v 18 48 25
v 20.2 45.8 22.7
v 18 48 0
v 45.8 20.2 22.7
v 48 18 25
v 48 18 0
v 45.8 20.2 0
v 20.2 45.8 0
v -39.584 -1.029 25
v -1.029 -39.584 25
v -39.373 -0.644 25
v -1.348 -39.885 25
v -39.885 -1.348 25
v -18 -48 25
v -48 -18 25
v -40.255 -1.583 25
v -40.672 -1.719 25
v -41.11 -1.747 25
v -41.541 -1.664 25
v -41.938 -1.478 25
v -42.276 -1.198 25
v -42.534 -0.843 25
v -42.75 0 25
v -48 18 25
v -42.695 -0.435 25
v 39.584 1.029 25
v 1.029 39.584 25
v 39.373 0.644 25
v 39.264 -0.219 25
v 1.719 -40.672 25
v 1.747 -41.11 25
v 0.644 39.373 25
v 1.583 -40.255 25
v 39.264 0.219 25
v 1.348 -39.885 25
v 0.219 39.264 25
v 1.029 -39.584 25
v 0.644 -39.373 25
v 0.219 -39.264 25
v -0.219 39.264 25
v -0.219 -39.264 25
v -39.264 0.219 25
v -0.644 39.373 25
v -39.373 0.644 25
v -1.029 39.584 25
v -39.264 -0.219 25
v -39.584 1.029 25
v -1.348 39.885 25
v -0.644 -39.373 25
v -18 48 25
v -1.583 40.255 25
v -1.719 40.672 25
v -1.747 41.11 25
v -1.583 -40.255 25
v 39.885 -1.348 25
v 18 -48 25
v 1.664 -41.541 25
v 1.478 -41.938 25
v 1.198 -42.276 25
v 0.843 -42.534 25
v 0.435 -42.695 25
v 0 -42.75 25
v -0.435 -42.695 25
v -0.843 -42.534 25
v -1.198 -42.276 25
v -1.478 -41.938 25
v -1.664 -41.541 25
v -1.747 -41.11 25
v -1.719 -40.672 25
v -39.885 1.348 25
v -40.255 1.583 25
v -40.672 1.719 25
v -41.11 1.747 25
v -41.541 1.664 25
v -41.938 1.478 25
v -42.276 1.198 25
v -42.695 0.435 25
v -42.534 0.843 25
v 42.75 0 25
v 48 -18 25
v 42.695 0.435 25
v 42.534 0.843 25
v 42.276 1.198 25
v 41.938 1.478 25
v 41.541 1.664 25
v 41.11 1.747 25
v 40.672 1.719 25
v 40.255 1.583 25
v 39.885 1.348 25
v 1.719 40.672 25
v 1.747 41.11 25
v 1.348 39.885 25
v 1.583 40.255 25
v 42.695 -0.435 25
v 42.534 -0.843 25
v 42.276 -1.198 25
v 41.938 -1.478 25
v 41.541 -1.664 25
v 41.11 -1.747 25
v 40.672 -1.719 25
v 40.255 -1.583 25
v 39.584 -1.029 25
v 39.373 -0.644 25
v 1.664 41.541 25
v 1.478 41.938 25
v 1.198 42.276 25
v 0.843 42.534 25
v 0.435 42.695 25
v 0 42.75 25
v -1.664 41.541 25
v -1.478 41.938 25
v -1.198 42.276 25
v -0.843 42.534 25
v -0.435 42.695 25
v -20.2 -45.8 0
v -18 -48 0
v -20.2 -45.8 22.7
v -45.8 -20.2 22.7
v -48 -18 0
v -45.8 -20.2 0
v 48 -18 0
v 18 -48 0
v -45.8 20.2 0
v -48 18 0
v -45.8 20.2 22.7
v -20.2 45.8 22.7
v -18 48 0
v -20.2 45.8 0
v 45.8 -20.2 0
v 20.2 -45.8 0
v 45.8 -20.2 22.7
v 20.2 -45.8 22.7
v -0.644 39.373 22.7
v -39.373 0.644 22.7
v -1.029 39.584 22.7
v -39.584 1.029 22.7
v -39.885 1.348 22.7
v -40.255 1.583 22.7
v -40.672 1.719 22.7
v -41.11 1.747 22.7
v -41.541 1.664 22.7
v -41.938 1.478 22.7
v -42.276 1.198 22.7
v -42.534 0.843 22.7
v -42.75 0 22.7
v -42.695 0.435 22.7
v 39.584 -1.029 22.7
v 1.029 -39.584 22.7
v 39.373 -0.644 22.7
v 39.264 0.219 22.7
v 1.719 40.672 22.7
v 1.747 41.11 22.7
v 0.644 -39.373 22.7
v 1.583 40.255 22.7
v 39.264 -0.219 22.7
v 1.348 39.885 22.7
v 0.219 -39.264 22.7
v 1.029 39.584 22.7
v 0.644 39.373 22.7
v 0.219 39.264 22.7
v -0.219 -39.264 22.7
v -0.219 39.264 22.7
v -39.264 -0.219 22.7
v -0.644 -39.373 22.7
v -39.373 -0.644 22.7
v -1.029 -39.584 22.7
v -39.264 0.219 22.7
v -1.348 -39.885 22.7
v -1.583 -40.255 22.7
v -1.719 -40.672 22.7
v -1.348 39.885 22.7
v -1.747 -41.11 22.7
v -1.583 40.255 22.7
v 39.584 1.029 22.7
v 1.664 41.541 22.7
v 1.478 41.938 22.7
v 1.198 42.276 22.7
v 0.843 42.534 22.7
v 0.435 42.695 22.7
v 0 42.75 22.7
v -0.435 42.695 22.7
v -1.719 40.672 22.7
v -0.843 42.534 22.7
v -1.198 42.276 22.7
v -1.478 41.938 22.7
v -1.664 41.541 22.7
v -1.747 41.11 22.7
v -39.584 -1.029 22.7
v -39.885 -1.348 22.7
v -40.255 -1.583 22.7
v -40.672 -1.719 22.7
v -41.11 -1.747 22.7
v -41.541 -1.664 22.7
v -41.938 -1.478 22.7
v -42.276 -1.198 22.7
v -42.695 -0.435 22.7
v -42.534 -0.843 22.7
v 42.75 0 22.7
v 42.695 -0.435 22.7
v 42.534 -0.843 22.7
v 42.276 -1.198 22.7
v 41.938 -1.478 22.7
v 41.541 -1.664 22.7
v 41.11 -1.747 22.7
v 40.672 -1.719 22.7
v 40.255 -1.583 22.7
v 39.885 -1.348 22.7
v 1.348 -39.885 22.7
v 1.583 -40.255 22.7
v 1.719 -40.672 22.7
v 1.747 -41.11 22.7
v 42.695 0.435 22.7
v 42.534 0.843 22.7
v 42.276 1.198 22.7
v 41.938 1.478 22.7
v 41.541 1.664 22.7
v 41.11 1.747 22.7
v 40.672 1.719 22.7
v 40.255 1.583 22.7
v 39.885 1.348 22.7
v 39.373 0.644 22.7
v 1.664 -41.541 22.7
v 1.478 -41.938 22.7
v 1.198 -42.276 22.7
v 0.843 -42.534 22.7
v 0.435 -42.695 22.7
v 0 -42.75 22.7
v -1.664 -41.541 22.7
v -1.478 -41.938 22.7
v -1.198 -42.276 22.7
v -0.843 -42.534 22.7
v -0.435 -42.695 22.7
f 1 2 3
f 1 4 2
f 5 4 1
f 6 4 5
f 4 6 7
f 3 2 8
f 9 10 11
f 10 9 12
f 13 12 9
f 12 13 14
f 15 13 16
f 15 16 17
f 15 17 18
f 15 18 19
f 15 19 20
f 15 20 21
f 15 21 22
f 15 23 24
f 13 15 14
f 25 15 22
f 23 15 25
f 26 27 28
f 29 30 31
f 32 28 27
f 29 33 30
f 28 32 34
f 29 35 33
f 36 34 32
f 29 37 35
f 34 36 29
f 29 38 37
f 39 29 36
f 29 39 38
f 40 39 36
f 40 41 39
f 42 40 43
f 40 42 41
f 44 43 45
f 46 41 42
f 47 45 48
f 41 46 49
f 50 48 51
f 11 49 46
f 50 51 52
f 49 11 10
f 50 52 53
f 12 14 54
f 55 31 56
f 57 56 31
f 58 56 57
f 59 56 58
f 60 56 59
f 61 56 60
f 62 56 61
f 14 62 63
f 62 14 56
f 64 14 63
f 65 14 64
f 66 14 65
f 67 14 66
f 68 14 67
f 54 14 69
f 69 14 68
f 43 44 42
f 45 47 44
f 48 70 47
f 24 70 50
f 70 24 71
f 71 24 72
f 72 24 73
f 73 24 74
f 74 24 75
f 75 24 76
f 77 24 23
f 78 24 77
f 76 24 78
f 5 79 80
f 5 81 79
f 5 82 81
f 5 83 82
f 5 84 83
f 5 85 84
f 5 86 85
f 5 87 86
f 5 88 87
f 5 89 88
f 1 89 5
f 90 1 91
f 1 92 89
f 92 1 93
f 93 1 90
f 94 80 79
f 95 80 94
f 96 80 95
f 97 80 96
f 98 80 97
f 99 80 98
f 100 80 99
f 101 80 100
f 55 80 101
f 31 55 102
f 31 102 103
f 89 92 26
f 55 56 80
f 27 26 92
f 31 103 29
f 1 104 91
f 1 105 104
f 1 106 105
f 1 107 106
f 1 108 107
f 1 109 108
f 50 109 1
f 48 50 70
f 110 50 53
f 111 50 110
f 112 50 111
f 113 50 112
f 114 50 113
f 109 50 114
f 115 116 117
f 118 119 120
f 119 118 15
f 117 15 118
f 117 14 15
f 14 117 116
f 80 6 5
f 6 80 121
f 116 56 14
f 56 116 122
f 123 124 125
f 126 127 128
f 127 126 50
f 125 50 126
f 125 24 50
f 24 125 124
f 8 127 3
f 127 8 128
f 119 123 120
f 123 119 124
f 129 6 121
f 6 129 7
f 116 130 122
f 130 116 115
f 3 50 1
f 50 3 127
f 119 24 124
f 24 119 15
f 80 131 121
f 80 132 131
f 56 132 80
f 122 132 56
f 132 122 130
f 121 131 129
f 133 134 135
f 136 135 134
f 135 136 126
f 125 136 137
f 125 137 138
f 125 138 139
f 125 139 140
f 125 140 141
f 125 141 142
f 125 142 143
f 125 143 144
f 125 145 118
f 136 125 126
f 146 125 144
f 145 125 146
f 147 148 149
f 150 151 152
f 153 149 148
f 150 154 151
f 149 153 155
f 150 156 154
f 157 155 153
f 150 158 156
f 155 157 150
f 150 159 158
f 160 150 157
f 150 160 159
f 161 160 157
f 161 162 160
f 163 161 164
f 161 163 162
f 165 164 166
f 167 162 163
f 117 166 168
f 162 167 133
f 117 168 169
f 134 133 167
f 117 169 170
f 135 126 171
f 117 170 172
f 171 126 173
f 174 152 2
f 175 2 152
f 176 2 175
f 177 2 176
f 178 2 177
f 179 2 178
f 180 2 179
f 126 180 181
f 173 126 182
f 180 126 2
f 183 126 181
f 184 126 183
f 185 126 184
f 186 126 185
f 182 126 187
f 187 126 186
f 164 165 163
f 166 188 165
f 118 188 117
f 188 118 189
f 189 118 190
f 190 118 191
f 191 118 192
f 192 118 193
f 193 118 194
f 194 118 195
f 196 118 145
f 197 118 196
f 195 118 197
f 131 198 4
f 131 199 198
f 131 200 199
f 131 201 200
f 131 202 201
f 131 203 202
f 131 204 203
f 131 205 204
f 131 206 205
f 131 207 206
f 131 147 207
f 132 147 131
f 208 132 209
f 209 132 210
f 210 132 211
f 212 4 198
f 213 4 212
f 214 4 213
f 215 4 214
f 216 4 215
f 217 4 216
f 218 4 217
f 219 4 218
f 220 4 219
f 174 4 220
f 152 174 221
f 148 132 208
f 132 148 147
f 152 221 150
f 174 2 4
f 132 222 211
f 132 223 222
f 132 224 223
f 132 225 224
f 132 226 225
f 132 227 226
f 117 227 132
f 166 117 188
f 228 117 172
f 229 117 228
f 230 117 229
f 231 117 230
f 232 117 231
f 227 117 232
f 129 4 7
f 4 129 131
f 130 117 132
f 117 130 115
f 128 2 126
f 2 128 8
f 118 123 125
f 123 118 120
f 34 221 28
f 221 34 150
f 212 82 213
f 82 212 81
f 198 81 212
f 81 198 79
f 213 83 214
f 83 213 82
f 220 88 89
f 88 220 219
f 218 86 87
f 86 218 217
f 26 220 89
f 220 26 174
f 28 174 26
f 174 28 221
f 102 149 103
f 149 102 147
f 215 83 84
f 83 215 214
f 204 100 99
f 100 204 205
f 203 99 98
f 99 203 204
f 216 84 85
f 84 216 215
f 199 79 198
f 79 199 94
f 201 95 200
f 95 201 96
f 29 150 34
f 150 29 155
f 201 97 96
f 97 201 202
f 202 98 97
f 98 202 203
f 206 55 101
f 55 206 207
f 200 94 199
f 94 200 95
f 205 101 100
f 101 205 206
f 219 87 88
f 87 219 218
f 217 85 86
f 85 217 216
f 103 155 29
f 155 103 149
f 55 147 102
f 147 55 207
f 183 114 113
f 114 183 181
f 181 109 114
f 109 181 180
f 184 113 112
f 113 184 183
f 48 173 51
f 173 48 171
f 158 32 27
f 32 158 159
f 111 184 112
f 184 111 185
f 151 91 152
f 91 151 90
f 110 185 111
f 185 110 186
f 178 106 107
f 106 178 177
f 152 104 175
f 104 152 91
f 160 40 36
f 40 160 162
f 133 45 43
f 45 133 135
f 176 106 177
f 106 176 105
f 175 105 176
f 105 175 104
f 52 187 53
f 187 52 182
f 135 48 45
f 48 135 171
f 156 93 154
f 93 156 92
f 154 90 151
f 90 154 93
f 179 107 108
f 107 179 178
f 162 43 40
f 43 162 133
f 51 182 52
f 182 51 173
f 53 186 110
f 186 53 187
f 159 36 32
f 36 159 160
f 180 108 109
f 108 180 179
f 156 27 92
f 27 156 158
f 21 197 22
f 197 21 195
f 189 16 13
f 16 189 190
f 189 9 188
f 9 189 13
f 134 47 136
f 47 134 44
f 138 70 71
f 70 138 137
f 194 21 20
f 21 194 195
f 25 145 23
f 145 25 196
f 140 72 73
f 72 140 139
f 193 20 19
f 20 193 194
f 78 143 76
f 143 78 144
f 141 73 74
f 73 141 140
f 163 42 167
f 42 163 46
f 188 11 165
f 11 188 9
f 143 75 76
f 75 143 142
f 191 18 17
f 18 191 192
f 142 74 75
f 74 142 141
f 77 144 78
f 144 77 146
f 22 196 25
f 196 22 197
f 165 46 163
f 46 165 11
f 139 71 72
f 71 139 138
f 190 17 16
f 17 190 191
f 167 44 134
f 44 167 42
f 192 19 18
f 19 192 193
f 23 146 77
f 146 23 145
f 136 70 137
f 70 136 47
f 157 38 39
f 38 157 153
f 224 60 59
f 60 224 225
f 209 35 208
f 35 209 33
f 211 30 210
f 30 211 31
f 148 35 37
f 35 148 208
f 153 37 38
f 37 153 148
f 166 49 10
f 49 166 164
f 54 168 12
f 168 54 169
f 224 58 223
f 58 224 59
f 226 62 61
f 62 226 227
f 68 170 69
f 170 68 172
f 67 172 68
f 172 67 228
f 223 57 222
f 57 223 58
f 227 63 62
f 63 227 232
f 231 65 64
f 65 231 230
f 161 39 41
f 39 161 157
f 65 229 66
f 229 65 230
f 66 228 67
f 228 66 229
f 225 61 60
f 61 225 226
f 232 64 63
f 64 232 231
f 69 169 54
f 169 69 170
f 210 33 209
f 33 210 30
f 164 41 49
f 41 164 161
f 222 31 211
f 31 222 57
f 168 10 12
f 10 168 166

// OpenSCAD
// file: ../util/hole3.scad
module hole3()
{
    cylinder(d=3.5, h=99, center=true);
}
// file: ../util/repeat4.scad
module repeat4()
{
    for (r=[0:3])
    rotate([0,0,90*r])
    children();
}
// file: ../util/octopath.scad
// Follow an octogonal path
module octopath(X, Y, thickness, center=false)
{
    union() {
        linear_extrude(thickness, center=center)
            polygon(points=[
                    [X, Y], [X, -Y], 
                    [Y, -X], [-Y, -X],
                    [-X, -Y], [-X, Y],
                    [-Y, X], [Y, X], 
            ]);
    }
}
// file: ../models/ollo.scad
// Diameter of plastic ollo holes
OlloHoles = 4.3;

// Width of Ollo "real" plastic
OlloWidth = 3;

// Distance between two ollo holes
OlloSpacing = 6;

// Do an Ollo hole on the part
module olloHole(depth=2.2)
{
    translate([0,0,-0.1])
      cylinder(depth+0.2, OlloHoles/2, OlloHoles/2);
}

// Do 3 ollo holes
module threeOllo(depth=2.2)
{
  for (xy=[[-OlloSpacing,0],[0,0],[OlloSpacing,0]]) {
    translate([xy[0], xy[1], 0])
    olloHole(depth);
  }
}

// Do a servo arm holes
module servoArm(depth=2.2)
{
    threeOllo(depth);
    rotate([0,0,90])
      threeOllo(depth);
}
// main file
use <../models/ollo.scad>;
use <../util/octopath.scad>;
use <../util/repeat4.scad>;
use <../util/hole3.scad>;

$fn=25;

module head(height=25, thickness=2.2, print=false) {
    // The layout path
    X=48;
    Y=18;

    if (print) {
        translate([0,0,height])
        rotate([-180,0,0])
        head(height, thickness, false);
    } else {
        difference() {
            union() {    
                difference() {    
                    octopath(X, Y, thickness=height);
                    
                    // Craving the inside
                    translate([0,0,-0.1])
                    octopath(X-thickness, Y+3, thickness=height-thickness);
                }
        
                // If you don't have spacer, you can uncomment this and use long
                // screws
                /*
                repeat4()
                translate([41,0,0])
                difference() {
                    translate([0,0,10])
                    cylinder(d=6, h=height-10);
                    translate([0,0,-1])
                    cylinder(d=4, h=height-10);
                }
                */
            }
            
                    
            // Holes for magnets
            repeat4()
            translate([41,0,0])
            hole3();
        }
    }
}

head(thickness=2.2);
